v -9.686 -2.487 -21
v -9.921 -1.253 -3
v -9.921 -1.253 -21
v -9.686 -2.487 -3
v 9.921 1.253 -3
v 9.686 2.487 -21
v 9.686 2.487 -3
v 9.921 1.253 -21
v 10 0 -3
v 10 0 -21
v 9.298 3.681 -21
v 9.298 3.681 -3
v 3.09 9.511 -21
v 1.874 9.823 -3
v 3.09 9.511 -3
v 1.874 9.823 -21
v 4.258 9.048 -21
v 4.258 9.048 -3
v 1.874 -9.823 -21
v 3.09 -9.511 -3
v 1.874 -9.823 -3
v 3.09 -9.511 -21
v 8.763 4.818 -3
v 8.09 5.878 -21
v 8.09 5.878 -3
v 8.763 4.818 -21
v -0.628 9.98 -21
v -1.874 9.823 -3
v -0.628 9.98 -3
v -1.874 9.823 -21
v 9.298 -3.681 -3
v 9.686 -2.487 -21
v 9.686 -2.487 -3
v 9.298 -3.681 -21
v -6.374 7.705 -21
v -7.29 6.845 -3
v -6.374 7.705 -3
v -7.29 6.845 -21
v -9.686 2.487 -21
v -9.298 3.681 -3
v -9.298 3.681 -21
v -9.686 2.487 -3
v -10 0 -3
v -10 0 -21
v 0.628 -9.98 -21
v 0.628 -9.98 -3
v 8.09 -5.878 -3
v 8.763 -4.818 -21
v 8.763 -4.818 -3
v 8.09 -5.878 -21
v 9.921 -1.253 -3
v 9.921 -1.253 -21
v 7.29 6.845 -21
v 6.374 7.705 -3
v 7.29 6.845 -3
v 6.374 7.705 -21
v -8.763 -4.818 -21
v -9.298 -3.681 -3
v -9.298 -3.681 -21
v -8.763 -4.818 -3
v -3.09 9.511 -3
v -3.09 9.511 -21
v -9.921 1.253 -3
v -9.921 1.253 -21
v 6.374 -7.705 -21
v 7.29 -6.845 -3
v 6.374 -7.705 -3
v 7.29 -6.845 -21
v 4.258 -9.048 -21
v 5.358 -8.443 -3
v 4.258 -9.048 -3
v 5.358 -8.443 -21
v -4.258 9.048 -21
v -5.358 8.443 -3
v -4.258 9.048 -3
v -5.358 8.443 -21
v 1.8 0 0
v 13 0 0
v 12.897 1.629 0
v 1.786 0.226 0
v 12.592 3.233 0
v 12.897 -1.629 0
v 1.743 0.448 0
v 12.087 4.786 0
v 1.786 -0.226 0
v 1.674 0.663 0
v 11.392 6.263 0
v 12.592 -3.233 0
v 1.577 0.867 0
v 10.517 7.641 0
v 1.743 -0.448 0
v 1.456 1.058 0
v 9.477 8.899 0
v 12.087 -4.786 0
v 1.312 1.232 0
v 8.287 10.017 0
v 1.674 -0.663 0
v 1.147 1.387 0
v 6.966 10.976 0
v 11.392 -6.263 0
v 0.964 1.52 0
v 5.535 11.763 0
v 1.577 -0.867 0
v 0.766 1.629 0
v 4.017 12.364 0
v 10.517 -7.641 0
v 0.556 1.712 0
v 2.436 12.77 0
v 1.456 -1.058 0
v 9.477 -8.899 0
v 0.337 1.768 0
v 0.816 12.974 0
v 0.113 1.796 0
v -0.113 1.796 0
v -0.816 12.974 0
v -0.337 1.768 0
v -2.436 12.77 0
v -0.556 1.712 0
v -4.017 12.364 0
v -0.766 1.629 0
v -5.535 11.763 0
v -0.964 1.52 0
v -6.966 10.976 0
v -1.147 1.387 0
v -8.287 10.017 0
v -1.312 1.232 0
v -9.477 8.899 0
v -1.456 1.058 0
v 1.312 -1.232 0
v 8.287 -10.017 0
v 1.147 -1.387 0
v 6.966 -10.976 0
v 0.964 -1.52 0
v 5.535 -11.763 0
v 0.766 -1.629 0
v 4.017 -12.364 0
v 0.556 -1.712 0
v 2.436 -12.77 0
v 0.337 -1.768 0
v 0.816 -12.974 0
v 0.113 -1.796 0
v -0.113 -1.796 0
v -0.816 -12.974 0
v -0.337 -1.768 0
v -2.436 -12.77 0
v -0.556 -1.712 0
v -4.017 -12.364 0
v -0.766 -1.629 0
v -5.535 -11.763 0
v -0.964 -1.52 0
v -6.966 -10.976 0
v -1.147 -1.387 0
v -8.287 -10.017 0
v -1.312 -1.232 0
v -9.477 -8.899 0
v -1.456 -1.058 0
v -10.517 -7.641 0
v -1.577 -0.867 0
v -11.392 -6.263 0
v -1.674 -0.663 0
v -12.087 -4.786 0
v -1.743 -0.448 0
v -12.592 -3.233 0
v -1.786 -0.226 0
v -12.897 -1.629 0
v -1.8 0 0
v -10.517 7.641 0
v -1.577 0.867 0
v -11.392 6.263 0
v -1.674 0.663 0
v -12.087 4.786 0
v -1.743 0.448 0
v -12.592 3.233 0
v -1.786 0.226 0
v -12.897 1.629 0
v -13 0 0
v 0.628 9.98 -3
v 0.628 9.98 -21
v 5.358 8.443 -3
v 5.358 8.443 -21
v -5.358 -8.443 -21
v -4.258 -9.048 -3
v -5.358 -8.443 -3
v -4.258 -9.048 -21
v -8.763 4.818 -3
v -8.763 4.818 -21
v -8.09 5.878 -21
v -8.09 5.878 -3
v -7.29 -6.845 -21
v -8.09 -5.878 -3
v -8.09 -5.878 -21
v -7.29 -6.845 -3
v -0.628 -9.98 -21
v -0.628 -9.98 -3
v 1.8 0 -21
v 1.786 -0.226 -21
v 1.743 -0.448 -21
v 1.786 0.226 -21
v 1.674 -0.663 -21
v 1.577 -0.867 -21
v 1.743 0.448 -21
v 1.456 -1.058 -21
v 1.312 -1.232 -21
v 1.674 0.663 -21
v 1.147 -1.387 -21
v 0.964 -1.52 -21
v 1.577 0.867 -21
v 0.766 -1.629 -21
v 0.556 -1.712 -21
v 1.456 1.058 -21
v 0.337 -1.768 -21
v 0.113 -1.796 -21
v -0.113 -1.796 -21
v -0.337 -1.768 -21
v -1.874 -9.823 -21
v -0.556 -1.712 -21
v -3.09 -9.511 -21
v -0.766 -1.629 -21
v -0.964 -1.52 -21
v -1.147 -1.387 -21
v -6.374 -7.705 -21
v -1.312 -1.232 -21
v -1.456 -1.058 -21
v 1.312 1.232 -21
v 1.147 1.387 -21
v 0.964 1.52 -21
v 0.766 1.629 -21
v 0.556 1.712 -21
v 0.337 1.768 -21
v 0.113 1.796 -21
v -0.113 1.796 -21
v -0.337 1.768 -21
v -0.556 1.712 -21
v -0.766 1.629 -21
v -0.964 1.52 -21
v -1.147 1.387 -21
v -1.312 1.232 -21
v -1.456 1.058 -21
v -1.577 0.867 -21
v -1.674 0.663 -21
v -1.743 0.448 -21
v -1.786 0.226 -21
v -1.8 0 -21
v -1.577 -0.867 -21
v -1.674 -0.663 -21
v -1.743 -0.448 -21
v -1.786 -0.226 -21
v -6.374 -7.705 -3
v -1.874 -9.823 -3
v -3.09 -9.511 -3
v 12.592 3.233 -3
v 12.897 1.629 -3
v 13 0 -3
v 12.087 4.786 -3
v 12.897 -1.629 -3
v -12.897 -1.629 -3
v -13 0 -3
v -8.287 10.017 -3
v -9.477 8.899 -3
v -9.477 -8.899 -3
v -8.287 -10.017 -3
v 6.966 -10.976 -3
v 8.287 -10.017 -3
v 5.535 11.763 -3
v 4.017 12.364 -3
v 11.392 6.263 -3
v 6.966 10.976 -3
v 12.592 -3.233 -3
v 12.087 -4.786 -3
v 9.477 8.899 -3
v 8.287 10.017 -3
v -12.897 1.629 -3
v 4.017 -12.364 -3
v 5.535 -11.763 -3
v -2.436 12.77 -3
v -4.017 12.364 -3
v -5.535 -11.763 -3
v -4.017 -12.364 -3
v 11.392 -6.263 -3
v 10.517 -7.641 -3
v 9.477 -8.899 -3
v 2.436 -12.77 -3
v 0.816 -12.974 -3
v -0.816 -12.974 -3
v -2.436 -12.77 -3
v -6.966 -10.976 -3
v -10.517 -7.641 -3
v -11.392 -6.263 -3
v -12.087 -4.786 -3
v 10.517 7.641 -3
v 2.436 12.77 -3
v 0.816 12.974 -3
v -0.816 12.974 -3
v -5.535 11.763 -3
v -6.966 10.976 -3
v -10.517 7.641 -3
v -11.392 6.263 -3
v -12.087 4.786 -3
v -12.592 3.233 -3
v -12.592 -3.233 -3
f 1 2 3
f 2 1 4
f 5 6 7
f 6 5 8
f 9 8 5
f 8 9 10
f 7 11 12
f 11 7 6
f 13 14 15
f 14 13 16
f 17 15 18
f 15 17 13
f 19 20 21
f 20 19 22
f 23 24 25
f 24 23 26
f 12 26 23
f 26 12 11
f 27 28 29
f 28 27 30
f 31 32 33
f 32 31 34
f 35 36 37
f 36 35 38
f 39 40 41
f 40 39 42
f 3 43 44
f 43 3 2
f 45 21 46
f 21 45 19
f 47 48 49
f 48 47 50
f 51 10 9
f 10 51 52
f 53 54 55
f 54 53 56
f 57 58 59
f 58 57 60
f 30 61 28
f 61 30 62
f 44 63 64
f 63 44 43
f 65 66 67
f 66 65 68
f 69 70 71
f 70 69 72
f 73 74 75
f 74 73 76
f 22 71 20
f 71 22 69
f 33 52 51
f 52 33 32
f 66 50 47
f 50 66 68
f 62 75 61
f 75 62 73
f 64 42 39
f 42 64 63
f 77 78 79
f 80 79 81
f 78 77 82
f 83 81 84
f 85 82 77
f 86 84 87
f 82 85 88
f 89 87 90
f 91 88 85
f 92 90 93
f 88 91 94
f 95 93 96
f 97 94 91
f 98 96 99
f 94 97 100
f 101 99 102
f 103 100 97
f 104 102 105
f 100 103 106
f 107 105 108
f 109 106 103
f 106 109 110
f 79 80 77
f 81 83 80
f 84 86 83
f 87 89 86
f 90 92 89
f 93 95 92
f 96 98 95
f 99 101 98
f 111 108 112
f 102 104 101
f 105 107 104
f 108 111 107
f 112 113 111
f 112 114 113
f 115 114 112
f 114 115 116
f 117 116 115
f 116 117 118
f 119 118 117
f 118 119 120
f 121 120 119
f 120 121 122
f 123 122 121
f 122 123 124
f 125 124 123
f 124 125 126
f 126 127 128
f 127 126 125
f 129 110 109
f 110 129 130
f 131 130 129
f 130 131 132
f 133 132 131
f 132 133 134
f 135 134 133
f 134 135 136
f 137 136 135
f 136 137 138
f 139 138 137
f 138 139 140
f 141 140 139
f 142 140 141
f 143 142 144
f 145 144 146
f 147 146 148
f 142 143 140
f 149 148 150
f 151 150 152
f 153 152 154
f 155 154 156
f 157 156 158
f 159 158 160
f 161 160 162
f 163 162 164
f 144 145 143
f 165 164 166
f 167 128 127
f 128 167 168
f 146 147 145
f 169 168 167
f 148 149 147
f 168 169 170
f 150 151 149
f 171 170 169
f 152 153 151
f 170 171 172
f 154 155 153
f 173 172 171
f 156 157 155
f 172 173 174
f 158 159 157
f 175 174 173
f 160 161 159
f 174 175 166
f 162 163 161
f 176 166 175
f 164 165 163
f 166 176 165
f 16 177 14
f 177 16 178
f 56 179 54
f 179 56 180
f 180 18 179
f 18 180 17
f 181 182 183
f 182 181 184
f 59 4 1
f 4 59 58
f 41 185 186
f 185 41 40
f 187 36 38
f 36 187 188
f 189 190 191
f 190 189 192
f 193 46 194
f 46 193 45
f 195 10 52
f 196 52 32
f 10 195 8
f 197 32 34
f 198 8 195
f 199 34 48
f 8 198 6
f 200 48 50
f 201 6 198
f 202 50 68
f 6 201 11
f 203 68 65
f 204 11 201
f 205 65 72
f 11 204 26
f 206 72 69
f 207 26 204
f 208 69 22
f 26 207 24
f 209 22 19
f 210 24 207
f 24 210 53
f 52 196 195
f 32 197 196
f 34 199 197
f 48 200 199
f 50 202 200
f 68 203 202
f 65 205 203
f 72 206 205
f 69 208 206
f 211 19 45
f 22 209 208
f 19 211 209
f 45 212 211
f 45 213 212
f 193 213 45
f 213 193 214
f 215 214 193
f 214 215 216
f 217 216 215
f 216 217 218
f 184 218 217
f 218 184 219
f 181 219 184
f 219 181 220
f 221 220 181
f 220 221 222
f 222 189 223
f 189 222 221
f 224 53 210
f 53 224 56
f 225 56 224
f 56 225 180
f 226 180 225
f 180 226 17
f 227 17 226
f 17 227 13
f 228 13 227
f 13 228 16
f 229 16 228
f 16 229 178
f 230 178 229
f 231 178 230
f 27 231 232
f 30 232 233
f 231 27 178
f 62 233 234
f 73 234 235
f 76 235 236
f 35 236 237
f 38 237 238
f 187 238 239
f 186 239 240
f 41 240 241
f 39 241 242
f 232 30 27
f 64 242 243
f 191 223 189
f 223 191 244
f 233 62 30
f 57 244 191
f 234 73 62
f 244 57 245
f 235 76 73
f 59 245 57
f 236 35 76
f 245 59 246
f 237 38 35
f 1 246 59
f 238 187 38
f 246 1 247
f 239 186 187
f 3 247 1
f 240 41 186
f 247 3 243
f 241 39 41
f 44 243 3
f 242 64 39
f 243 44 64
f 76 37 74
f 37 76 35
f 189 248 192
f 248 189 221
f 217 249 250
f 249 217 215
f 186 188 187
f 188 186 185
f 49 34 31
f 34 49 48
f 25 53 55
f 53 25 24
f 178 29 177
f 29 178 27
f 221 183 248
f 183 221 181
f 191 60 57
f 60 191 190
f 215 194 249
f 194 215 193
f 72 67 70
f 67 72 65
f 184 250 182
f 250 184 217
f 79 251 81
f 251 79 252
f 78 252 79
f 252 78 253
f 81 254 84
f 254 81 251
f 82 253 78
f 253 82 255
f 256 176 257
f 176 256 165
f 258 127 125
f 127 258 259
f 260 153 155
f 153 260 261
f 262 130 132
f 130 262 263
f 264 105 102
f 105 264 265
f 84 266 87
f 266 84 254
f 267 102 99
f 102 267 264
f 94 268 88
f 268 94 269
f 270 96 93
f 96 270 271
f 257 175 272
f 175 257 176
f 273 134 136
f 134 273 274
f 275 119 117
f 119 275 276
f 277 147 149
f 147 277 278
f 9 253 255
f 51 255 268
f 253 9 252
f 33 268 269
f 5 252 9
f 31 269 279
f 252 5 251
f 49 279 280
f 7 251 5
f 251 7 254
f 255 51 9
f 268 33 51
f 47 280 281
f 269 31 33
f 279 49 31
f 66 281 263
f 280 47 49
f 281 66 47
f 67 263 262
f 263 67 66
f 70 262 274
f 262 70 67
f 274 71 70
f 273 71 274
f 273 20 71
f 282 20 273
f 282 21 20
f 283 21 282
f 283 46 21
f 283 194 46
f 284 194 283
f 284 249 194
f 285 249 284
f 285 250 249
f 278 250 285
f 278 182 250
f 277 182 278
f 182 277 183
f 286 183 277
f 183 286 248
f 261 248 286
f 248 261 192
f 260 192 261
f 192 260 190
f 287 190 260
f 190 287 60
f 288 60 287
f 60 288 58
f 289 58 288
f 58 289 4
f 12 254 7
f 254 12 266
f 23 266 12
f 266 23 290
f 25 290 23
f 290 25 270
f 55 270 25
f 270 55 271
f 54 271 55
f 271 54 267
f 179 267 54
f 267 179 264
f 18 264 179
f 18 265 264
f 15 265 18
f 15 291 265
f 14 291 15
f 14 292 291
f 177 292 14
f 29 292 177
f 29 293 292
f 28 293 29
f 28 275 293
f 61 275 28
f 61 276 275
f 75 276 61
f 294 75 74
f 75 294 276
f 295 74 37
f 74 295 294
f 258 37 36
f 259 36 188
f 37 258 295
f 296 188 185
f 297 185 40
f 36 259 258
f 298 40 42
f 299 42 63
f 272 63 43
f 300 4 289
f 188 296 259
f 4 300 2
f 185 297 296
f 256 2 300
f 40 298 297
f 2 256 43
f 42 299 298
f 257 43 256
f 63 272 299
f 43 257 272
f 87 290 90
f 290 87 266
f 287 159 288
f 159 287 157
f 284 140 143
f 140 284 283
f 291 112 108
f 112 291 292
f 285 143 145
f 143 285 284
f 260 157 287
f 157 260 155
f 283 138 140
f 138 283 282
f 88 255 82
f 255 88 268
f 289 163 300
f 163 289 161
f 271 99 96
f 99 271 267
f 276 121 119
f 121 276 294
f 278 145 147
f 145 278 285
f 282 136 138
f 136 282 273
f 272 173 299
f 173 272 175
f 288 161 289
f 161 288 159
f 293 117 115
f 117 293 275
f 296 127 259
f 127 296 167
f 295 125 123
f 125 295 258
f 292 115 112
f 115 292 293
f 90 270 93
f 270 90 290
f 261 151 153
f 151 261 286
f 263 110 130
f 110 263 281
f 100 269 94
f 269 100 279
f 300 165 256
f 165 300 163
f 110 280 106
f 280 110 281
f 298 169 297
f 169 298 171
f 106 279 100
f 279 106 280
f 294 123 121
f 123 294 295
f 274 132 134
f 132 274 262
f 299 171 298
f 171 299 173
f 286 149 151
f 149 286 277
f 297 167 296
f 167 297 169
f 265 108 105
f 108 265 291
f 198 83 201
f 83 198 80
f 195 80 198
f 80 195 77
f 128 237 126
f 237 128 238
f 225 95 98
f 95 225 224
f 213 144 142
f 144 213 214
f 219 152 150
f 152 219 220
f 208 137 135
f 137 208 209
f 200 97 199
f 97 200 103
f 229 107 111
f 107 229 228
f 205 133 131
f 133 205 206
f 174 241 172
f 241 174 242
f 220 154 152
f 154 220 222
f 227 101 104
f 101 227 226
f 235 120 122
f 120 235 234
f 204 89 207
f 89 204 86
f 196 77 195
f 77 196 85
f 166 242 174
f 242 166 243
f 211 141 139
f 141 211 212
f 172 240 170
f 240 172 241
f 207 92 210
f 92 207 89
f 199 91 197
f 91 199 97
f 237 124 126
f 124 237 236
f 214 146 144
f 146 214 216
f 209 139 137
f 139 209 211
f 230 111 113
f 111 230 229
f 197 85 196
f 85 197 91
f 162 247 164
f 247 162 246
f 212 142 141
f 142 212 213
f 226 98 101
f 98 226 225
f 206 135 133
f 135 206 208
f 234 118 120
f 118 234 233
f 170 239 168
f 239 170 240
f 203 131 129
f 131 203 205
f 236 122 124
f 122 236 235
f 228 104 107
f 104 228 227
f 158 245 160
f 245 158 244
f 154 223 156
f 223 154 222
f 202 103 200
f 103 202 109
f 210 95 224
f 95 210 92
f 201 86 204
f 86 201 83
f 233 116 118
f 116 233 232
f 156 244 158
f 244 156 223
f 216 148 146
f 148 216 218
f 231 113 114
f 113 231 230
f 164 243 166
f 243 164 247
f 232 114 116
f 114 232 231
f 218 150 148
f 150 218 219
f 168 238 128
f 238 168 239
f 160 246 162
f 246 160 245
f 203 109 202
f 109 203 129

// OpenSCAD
$fn = 50;


difference() {
	union() {
		translate(v = [0, 0, -21.0000000000]) {
			cylinder(h = 21, r = 10.0000000000);
		}
		translate(v = [0, 0, -3.0000000000]) {
			cylinder(h = 3, r = 13.0000000000);
		}
	}
	union() {
		#translate(v = [0, 0, -21]) {
			cylinder(h = 21, r = 1.8000000000);
		}
	}
}
